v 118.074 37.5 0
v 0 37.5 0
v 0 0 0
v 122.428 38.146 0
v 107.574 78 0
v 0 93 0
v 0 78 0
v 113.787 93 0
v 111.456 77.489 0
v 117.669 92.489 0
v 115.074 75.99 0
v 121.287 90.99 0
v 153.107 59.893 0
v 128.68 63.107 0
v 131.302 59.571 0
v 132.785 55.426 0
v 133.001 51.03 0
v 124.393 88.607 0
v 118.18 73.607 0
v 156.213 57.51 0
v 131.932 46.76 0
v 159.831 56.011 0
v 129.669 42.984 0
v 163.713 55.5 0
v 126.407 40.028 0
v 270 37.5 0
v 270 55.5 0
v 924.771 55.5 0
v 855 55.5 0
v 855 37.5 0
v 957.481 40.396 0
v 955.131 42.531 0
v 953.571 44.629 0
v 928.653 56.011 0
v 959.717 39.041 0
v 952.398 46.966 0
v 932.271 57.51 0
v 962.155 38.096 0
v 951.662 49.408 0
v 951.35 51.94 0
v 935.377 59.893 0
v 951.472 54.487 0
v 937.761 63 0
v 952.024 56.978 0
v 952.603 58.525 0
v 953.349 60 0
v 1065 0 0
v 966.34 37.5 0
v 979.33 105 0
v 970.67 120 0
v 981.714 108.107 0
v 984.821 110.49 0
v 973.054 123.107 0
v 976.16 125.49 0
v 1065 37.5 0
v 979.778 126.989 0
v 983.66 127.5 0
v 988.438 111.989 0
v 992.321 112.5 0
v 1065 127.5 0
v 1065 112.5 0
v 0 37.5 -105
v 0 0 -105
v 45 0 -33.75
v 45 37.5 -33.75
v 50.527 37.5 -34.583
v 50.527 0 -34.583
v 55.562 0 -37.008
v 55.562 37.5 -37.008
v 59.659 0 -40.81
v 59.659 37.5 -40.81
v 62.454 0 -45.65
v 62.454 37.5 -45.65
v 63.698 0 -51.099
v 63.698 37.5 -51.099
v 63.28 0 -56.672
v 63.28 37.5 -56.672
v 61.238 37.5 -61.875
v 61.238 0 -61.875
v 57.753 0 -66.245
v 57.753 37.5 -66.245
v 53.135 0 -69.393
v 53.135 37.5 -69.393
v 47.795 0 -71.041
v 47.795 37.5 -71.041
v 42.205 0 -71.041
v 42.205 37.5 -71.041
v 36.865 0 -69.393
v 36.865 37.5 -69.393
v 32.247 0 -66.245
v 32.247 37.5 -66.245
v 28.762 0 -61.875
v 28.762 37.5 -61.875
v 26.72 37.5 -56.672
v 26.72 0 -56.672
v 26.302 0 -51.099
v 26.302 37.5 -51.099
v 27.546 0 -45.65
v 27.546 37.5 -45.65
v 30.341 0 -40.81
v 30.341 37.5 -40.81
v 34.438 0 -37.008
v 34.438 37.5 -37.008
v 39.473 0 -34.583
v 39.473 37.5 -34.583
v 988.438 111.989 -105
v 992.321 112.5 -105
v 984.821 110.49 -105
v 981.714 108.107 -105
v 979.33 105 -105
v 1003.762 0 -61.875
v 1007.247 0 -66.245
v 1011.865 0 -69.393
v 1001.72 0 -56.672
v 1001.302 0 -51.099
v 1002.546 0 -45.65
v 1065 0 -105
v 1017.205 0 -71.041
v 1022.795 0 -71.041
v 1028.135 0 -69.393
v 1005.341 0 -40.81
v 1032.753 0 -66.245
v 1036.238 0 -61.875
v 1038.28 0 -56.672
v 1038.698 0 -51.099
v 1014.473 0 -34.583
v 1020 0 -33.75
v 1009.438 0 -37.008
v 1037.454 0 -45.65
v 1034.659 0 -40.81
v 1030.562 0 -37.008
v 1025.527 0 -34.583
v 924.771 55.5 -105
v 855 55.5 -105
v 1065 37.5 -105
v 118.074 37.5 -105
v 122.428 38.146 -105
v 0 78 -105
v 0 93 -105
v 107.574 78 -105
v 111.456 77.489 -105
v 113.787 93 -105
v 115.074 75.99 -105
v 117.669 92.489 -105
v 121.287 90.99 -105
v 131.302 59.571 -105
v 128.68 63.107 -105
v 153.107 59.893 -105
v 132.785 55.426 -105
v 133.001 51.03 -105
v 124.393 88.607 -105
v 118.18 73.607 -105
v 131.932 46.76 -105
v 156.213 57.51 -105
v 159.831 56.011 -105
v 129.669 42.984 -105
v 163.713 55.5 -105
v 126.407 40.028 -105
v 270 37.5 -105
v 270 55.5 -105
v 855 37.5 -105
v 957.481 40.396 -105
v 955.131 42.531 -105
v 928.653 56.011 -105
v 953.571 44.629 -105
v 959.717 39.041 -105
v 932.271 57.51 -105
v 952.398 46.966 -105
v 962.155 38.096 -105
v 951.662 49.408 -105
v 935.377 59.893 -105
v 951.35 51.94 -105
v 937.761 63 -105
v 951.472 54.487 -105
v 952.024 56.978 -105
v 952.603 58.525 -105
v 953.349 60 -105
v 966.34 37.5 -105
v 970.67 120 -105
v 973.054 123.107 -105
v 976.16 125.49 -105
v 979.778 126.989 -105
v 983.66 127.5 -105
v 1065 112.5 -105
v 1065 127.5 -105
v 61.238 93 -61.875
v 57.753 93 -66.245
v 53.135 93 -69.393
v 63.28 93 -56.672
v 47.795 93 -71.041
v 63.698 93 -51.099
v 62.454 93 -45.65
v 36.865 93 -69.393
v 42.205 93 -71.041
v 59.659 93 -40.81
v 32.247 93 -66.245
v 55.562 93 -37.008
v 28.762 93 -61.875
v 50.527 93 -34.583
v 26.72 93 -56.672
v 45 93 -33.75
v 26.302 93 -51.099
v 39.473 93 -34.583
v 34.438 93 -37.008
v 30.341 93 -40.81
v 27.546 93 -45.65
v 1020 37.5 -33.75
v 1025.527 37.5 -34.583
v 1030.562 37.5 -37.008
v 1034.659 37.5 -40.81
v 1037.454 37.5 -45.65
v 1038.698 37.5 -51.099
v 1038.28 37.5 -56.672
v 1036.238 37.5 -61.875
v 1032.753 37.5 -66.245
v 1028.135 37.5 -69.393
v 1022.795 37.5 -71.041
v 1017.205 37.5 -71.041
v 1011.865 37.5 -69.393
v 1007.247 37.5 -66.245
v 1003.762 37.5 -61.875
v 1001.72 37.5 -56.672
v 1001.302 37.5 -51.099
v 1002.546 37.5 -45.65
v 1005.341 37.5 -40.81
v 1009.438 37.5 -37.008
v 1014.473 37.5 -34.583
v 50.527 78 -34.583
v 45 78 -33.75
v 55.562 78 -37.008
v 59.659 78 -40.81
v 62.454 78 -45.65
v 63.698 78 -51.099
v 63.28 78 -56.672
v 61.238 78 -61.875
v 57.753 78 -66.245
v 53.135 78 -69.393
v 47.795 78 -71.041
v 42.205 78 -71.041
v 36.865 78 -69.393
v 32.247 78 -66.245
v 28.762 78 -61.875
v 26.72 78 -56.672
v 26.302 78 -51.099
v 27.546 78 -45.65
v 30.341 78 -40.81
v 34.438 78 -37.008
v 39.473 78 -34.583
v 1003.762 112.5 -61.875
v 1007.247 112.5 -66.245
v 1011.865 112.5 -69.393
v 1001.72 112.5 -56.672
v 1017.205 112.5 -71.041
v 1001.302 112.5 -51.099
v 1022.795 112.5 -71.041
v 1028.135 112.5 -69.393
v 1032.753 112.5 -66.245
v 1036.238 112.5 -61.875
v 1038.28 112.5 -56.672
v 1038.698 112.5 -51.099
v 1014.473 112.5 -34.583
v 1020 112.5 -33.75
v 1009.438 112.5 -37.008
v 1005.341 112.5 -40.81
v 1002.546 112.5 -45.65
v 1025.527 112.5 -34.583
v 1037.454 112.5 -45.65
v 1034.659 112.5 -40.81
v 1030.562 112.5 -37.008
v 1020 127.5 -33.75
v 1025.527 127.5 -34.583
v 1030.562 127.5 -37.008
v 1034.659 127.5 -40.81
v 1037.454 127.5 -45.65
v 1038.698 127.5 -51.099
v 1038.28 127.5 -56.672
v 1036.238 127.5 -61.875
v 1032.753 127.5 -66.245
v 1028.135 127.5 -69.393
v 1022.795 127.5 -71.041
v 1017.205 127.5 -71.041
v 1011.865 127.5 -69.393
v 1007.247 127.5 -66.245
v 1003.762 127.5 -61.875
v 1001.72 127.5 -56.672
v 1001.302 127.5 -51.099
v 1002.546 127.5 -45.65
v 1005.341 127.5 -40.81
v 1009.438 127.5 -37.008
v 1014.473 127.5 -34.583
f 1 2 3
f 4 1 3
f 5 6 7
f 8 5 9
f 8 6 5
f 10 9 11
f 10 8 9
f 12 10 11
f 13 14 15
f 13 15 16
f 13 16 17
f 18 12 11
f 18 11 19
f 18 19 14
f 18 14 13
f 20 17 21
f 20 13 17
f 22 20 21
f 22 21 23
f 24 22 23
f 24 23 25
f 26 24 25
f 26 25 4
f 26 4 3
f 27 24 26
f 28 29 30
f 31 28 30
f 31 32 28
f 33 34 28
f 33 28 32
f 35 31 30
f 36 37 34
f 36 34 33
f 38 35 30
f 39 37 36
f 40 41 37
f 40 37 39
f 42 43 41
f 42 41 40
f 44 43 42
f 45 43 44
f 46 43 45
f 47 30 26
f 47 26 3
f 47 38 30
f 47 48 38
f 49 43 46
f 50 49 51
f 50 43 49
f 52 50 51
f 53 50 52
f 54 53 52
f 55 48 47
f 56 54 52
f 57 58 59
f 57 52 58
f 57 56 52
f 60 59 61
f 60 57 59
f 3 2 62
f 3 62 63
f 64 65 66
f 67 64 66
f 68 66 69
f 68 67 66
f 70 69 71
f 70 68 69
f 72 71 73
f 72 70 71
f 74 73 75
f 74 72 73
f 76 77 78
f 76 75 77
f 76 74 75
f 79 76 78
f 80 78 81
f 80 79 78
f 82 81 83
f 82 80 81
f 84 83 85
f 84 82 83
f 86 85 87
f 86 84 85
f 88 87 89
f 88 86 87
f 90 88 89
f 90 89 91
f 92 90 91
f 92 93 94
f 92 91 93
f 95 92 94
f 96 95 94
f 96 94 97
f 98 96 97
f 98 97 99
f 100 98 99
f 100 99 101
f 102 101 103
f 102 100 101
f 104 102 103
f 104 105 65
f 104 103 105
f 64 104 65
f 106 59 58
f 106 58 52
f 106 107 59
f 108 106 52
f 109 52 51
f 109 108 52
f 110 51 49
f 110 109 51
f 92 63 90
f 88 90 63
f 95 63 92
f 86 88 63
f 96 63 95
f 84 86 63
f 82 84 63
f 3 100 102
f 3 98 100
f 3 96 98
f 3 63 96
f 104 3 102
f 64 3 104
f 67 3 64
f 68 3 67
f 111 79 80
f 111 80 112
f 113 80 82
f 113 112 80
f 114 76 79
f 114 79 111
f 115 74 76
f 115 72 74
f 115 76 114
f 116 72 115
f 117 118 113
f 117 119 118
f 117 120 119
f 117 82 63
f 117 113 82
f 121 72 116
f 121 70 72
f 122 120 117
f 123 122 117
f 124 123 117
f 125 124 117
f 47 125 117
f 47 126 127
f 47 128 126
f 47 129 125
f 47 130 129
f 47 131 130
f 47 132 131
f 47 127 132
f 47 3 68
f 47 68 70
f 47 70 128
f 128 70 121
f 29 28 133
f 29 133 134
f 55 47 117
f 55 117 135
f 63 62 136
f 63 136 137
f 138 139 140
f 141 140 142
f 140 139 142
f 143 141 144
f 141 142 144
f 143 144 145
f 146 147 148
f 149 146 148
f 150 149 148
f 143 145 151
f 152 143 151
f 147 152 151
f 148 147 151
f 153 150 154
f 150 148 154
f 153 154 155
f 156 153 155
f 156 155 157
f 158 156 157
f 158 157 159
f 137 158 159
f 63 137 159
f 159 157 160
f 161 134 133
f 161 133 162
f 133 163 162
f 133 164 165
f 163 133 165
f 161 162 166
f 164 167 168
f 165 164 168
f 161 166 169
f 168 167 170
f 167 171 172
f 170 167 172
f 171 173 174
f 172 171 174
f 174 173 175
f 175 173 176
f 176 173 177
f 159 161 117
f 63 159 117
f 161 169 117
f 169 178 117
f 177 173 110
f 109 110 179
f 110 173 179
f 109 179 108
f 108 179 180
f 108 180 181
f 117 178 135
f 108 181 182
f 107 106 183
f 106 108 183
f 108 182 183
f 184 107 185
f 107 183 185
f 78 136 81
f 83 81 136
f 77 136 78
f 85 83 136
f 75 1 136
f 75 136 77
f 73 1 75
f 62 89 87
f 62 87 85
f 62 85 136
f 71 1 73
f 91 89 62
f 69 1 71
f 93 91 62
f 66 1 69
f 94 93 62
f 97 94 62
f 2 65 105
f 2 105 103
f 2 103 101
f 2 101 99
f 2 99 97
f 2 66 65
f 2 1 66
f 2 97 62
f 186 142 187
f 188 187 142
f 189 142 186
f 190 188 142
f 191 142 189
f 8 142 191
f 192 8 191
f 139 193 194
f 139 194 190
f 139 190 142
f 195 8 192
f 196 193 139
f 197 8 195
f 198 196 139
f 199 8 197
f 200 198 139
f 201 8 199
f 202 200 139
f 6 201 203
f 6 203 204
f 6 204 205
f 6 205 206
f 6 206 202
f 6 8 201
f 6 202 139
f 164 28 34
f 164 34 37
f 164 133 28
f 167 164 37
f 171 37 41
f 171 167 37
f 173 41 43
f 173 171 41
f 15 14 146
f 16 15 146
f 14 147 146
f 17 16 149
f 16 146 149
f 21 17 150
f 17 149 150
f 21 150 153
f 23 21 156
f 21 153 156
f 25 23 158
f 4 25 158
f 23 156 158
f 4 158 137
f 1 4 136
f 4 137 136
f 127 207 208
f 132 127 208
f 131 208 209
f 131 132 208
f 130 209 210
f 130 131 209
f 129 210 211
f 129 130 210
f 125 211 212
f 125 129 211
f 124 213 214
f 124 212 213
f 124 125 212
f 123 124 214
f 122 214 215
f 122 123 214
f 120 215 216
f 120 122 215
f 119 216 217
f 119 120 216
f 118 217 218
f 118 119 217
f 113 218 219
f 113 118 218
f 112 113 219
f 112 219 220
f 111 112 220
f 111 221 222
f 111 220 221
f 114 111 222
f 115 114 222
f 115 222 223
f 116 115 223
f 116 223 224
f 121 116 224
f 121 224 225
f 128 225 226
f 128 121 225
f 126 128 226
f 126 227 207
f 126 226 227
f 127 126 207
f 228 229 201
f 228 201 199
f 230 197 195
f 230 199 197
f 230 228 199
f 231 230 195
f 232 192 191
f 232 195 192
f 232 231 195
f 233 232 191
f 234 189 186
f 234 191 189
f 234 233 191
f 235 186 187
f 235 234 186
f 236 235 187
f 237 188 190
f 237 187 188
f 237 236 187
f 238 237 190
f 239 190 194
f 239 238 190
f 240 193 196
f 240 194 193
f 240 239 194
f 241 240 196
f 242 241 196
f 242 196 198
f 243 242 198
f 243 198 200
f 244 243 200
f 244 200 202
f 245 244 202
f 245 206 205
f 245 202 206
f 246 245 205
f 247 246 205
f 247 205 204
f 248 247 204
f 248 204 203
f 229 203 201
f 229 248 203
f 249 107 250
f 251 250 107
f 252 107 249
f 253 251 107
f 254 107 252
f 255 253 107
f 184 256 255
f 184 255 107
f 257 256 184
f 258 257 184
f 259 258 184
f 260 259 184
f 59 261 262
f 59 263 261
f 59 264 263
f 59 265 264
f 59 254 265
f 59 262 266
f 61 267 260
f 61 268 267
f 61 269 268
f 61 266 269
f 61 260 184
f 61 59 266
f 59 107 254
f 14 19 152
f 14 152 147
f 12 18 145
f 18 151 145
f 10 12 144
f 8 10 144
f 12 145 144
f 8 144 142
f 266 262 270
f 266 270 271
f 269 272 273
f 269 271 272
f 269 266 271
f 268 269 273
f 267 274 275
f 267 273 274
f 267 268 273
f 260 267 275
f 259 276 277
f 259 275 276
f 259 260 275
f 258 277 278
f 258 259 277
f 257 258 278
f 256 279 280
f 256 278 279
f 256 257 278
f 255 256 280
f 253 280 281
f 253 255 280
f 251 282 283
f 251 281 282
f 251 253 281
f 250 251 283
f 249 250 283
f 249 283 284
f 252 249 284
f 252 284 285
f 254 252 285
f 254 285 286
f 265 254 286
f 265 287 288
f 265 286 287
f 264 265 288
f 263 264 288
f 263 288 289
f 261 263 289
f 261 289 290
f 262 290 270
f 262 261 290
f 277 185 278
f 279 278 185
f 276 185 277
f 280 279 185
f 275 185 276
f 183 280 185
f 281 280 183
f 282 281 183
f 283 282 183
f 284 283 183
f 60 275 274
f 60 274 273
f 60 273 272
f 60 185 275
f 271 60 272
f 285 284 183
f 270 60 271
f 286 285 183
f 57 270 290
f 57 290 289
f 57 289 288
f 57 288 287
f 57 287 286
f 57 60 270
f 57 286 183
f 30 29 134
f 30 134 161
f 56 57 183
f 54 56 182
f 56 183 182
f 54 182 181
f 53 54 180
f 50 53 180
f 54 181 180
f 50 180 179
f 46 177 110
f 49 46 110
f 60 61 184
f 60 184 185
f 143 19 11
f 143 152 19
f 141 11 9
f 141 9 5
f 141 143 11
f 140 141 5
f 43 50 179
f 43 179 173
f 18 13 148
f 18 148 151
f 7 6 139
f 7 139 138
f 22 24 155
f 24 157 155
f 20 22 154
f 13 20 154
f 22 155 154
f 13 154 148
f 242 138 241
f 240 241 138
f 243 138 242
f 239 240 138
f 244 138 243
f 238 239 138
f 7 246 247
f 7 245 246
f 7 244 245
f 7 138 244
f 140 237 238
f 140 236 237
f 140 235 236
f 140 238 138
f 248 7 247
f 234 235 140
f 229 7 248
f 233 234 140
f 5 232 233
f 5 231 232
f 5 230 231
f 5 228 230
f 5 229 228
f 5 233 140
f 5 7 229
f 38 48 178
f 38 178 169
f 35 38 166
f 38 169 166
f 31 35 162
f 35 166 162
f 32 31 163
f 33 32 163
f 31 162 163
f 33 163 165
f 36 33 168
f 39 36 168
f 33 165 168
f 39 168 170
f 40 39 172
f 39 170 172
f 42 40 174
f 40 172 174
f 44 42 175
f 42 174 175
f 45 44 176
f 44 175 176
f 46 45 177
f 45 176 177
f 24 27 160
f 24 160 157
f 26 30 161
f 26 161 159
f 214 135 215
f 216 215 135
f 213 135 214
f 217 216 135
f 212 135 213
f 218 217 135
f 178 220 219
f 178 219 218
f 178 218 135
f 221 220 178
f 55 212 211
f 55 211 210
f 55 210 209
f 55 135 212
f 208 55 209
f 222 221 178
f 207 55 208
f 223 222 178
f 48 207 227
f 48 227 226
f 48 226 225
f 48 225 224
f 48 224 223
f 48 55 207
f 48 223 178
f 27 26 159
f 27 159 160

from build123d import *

# Parameters (mm, degrees)
BOSS_EXTRUDE3_DEPTH     = 105
FILLET4_R               = 15
FILLET5_R               = 15
FILLET6_R               = 15
FILLET7_R               = 15
FILLET8_R               = 15
CUT_EXTRUDE3_DEPTH      = 1075.196909441
CUT_EXTRUDE3_DEPTH_BACK = 1075.196909441
SKETCH2_R               = 18.75


with BuildPart() as part:
    # Sketch1 → Boss-Extrude3 (new body)
    with BuildSketch(Plane.XY):
        Polygon((0, 93), (0, 78), (113.786796564, 78), (154.286796564, 37.5), (0, 37.5), (0, 0), (1065, 0), (1065, 37.5), (940.922649001, 37.5), (946.421161675, 48), (983.660254038, 112.5), (1065, 112.5), (1065, 127.5), (975, 127.5), (933.430780618, 55.5), (855, 55.5), (855, 37.5), (270, 37.5), (270, 55.5), (157.5, 55.5), (120, 93), align=None)
    extrude(amount=-BOSS_EXTRUDE3_DEPTH)

    # Fillet4
    fillet4_edges = [part.edges().sort_by_distance(p)[0] for p in [
        (157.5, 55.5, -52.5),
        (120, 93, -52.5),
        (940.922649001, 37.5, -52.5),
        (975, 127.5, -52.5),
    ]]
    fillet(fillet4_edges, radius=FILLET4_R)

    # Fillet5
    fillet5_edges = [part.edges().sort_by_distance(p)[0] for p in [
        (113.786796564, 78, -52.5),
    ]]
    fillet(fillet5_edges, radius=FILLET5_R)

    # Fillet6
    fillet6_edges = [part.edges().sort_by_distance(p)[0] for p in [
        (154.286796564, 37.5, -52.5),
    ]]
    fillet(fillet6_edges, radius=FILLET6_R)

    # Fillet7
    fillet7_edges = [part.edges().sort_by_distance(p)[0] for p in [
        (933.430780618, 55.5, -52.5),
    ]]
    fillet(fillet7_edges, radius=FILLET7_R)

    # Fillet8
    fillet8_edges = [part.edges().sort_by_distance(p)[0] for p in [
        (983.660254038, 112.5, -52.5),
    ]]
    fillet(fillet8_edges, radius=FILLET8_R)

    # Sketch2 → Cut-Extrude3 (cut, two sides: drawn at the far end of the back side and taken through both)
    with BuildSketch(Plane(origin=(0, 93, 0), x_dir=(1, 0, 0), z_dir=(0, 1, 0)).offset(-CUT_EXTRUDE3_DEPTH_BACK)):
        with Locations(Location((45, 52.5, 0), (0, 0, 270))):
            Circle(SKETCH2_R)
        with Locations(Location((1020, 52.5, 0), (0, 0, 270))):
            Circle(SKETCH2_R)
    extrude(amount=CUT_EXTRUDE3_DEPTH + CUT_EXTRUDE3_DEPTH_BACK, mode=Mode.SUBTRACT)


solid = part.part
